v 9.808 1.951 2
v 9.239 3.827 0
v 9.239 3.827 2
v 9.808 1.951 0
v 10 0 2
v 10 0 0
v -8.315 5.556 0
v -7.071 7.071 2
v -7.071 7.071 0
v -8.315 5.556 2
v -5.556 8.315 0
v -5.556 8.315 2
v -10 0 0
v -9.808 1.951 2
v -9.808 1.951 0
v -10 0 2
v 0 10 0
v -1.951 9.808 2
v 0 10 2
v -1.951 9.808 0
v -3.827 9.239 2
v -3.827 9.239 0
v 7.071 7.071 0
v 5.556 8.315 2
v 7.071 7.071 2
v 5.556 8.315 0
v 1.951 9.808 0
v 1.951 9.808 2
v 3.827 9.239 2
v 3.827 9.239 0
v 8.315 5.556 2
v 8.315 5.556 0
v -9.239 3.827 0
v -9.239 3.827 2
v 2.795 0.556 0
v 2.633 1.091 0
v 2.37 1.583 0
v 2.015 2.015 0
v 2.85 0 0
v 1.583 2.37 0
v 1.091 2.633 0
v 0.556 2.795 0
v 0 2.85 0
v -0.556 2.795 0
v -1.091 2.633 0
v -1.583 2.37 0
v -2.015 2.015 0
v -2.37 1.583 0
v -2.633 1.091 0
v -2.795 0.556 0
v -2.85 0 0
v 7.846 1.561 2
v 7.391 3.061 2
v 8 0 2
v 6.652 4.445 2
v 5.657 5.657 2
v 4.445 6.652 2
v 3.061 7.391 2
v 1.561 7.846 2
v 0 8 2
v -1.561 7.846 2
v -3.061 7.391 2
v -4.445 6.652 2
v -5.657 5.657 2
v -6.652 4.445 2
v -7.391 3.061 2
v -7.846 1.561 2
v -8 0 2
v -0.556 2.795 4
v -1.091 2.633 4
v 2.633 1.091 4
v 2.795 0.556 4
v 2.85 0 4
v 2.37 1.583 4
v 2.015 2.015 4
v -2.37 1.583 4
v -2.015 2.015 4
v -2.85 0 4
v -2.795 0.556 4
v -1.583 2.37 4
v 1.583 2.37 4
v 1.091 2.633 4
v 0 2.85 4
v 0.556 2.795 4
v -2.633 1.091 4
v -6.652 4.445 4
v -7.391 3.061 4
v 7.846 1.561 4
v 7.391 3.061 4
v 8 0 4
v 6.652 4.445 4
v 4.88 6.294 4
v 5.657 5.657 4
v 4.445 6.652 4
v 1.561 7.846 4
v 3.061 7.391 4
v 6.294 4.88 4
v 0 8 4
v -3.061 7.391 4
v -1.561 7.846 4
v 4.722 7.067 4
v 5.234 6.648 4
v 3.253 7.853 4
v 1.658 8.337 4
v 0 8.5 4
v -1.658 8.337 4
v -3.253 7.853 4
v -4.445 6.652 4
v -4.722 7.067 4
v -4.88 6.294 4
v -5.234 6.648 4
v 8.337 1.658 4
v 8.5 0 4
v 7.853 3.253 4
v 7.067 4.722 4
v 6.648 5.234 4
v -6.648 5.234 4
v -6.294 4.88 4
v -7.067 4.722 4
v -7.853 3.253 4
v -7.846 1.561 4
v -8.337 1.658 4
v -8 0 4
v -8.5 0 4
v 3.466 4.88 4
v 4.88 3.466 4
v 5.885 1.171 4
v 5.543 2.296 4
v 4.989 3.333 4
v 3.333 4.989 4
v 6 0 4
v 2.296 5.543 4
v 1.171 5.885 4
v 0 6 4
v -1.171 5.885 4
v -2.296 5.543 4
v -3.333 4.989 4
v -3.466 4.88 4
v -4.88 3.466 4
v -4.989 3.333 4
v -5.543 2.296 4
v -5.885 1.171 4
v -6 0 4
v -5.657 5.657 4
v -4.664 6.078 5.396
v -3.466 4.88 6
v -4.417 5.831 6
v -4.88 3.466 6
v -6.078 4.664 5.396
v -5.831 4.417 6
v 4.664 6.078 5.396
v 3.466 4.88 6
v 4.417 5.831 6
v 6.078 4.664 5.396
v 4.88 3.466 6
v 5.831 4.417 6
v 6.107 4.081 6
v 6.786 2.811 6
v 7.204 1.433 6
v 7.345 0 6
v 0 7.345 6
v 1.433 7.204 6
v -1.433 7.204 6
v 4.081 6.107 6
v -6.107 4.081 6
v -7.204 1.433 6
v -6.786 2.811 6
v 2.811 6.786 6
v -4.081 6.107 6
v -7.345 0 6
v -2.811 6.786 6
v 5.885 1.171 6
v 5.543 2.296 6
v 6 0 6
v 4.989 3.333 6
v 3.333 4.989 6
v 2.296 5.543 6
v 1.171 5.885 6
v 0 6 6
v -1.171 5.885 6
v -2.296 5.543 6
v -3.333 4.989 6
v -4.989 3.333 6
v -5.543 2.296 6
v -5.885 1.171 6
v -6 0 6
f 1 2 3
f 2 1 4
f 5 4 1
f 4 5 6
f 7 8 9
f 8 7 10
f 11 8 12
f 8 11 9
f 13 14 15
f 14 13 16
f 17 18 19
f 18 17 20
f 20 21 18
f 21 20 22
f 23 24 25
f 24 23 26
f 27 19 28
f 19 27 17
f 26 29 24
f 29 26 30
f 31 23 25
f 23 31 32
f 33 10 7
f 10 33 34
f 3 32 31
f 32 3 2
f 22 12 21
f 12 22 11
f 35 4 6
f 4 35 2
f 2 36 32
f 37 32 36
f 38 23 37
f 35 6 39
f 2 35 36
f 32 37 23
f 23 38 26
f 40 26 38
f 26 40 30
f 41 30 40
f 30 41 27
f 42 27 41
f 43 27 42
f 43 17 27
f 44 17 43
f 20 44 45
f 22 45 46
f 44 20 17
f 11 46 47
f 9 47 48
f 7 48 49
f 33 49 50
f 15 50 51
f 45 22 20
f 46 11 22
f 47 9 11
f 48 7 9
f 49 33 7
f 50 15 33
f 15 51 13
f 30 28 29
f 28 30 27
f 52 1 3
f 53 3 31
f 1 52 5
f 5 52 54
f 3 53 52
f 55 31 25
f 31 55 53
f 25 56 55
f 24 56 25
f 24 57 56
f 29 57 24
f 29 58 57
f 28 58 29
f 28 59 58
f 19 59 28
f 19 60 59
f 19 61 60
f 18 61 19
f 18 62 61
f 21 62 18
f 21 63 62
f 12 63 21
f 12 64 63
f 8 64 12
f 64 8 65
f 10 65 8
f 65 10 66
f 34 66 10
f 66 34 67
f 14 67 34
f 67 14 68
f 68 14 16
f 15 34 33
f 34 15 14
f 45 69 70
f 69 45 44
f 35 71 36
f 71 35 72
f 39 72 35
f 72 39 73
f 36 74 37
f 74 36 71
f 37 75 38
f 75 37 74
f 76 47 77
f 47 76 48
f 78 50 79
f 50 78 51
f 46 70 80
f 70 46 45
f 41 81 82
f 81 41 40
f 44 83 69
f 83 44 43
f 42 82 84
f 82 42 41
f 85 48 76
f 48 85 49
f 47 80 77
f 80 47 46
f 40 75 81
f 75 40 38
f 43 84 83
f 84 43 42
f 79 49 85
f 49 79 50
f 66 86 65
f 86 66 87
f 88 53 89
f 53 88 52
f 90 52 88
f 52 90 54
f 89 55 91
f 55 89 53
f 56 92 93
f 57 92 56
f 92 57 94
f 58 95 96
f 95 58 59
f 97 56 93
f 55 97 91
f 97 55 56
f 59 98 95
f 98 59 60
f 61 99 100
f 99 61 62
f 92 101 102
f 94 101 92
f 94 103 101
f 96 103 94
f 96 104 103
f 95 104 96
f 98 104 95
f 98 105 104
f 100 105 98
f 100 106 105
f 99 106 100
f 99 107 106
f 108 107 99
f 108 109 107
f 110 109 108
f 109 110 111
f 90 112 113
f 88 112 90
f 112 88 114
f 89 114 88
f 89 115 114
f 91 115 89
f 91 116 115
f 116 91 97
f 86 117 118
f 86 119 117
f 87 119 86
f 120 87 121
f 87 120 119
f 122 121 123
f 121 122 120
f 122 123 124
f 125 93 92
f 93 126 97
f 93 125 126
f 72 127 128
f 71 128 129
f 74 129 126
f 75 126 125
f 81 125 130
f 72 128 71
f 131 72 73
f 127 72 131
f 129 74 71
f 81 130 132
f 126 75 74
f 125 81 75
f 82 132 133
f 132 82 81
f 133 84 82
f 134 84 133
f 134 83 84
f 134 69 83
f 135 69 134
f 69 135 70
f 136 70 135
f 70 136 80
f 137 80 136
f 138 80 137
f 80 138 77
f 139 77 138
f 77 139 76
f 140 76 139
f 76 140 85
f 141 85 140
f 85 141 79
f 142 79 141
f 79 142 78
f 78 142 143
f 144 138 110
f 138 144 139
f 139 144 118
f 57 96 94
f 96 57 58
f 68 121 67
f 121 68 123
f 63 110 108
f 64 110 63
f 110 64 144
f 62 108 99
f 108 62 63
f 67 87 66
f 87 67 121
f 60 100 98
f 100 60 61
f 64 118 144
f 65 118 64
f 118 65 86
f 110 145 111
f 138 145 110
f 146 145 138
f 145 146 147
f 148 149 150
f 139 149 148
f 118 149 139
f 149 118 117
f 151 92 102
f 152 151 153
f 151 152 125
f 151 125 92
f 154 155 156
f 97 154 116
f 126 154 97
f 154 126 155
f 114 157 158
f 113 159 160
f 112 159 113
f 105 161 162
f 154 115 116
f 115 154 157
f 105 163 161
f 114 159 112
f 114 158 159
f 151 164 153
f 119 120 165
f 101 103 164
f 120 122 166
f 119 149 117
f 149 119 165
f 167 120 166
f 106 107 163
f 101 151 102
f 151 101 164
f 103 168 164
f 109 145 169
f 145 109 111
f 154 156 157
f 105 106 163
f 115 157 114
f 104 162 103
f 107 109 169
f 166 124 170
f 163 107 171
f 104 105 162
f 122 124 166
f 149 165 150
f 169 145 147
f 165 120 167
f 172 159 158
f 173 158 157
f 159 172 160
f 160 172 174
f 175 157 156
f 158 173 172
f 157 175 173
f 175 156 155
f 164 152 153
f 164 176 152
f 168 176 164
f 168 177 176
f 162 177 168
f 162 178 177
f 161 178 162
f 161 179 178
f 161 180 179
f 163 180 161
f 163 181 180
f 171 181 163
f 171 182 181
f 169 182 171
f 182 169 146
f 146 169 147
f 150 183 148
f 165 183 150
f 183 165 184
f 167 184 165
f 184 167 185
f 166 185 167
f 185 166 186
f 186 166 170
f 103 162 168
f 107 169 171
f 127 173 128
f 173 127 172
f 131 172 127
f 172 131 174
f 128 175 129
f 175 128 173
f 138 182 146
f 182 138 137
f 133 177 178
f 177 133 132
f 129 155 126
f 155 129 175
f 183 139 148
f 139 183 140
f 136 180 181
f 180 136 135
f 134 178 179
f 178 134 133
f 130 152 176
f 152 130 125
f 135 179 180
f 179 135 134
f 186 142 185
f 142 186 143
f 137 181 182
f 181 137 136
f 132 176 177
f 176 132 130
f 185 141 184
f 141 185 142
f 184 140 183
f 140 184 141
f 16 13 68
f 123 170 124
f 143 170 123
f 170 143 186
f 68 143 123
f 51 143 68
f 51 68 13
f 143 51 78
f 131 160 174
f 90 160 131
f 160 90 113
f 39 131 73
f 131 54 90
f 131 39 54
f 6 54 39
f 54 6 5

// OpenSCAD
// file: ../stamp_generated.scad
// AUTO-GENERATED by scripts/Export-OpenScadStl.ps1 - do not edit by hand
// Source: print-stamp-config.json

info_stamp_line1 = "Verminology";
info_stamp_line2 = "Liquid Bait Station";
info_stamp_line3 = "v2.4.0 Prototype";
reservoir_stamp_bottom = false;
station_stamp_bottom = true;
needle_insert_export_stamp_bottom = false;
needle_gasket_export_stamp_bottom = false;
needle_seal_stamp_bottom = false;
// main file
// Needle Seal for V2 Liquid Bait Station — Print in TPU 90A (or 80A for easier flex)
// Center hole is undersized vs the pin for a water-tight interference fit; TPU stretches over the pin.

include <common.scad>

module needle_seal() {
    needle_seal_flange();
    needle_seal_disk();
    needle_seal_barb();
}

// Stop-collar flange — wider cylinder that sits on the reservoir floor
// and prevents the seal from being pushed into the reservoir.
// Center bore matches disk (seal_hole_dia) for one continuous inner diameter.
module needle_seal_flange() {
    difference() {
        cylinder(h = valve_flange_h, d = valve_flange_od);
        translate([0, 0, -0.5])
            cylinder(h = valve_flange_h + 1, d = seal_hole_dia);
    }
}

// Main disk — slides snugly into the reservoir bore.
// Center hole provides the water-tight seal around the pin.
module needle_seal_disk() {
    difference() {
        translate([0, 0, valve_flange_h])
            cylinder(h = valve_disk_h, d = valve_disk_od);

        // Seal hole — undersized for interference fit in TPU
        translate([0, 0, valve_flange_h - 0.5])
            cylinder(h = valve_disk_h + 1, d = seal_hole_dia);
    }
}

// ── Top Retention Disk ────────────────────────────────────────────
// Thin ring catches on the inside of the reservoir floor to prevent pull-out.
module needle_seal_barb() {
    taper_inset = valve_retainer_h * tan(30) * 2;
    translate([0, 0, valve_flange_h + valve_disk_h])
        difference() {
            cylinder(h = valve_retainer_h,
                     d1 = valve_retainer_od,
                     d2 = valve_retainer_od - taper_inset);
            translate([0, 0, -0.5])
                cylinder(h = valve_retainer_h + 1, d = valve_retainer_id);
            // Flow slots for fluid passage
            for (i = [0 : 3])
                rotate([0, 0, i * 90 + 45])
                    translate([-1, -valve_retainer_od / 2, -0.5])
                        cube([2, valve_retainer_od, valve_retainer_h + 1]);
        }
}

// ── Render ────────────────────────────────────────────────────────
crosssection(valve_flange_od) needle_seal();
